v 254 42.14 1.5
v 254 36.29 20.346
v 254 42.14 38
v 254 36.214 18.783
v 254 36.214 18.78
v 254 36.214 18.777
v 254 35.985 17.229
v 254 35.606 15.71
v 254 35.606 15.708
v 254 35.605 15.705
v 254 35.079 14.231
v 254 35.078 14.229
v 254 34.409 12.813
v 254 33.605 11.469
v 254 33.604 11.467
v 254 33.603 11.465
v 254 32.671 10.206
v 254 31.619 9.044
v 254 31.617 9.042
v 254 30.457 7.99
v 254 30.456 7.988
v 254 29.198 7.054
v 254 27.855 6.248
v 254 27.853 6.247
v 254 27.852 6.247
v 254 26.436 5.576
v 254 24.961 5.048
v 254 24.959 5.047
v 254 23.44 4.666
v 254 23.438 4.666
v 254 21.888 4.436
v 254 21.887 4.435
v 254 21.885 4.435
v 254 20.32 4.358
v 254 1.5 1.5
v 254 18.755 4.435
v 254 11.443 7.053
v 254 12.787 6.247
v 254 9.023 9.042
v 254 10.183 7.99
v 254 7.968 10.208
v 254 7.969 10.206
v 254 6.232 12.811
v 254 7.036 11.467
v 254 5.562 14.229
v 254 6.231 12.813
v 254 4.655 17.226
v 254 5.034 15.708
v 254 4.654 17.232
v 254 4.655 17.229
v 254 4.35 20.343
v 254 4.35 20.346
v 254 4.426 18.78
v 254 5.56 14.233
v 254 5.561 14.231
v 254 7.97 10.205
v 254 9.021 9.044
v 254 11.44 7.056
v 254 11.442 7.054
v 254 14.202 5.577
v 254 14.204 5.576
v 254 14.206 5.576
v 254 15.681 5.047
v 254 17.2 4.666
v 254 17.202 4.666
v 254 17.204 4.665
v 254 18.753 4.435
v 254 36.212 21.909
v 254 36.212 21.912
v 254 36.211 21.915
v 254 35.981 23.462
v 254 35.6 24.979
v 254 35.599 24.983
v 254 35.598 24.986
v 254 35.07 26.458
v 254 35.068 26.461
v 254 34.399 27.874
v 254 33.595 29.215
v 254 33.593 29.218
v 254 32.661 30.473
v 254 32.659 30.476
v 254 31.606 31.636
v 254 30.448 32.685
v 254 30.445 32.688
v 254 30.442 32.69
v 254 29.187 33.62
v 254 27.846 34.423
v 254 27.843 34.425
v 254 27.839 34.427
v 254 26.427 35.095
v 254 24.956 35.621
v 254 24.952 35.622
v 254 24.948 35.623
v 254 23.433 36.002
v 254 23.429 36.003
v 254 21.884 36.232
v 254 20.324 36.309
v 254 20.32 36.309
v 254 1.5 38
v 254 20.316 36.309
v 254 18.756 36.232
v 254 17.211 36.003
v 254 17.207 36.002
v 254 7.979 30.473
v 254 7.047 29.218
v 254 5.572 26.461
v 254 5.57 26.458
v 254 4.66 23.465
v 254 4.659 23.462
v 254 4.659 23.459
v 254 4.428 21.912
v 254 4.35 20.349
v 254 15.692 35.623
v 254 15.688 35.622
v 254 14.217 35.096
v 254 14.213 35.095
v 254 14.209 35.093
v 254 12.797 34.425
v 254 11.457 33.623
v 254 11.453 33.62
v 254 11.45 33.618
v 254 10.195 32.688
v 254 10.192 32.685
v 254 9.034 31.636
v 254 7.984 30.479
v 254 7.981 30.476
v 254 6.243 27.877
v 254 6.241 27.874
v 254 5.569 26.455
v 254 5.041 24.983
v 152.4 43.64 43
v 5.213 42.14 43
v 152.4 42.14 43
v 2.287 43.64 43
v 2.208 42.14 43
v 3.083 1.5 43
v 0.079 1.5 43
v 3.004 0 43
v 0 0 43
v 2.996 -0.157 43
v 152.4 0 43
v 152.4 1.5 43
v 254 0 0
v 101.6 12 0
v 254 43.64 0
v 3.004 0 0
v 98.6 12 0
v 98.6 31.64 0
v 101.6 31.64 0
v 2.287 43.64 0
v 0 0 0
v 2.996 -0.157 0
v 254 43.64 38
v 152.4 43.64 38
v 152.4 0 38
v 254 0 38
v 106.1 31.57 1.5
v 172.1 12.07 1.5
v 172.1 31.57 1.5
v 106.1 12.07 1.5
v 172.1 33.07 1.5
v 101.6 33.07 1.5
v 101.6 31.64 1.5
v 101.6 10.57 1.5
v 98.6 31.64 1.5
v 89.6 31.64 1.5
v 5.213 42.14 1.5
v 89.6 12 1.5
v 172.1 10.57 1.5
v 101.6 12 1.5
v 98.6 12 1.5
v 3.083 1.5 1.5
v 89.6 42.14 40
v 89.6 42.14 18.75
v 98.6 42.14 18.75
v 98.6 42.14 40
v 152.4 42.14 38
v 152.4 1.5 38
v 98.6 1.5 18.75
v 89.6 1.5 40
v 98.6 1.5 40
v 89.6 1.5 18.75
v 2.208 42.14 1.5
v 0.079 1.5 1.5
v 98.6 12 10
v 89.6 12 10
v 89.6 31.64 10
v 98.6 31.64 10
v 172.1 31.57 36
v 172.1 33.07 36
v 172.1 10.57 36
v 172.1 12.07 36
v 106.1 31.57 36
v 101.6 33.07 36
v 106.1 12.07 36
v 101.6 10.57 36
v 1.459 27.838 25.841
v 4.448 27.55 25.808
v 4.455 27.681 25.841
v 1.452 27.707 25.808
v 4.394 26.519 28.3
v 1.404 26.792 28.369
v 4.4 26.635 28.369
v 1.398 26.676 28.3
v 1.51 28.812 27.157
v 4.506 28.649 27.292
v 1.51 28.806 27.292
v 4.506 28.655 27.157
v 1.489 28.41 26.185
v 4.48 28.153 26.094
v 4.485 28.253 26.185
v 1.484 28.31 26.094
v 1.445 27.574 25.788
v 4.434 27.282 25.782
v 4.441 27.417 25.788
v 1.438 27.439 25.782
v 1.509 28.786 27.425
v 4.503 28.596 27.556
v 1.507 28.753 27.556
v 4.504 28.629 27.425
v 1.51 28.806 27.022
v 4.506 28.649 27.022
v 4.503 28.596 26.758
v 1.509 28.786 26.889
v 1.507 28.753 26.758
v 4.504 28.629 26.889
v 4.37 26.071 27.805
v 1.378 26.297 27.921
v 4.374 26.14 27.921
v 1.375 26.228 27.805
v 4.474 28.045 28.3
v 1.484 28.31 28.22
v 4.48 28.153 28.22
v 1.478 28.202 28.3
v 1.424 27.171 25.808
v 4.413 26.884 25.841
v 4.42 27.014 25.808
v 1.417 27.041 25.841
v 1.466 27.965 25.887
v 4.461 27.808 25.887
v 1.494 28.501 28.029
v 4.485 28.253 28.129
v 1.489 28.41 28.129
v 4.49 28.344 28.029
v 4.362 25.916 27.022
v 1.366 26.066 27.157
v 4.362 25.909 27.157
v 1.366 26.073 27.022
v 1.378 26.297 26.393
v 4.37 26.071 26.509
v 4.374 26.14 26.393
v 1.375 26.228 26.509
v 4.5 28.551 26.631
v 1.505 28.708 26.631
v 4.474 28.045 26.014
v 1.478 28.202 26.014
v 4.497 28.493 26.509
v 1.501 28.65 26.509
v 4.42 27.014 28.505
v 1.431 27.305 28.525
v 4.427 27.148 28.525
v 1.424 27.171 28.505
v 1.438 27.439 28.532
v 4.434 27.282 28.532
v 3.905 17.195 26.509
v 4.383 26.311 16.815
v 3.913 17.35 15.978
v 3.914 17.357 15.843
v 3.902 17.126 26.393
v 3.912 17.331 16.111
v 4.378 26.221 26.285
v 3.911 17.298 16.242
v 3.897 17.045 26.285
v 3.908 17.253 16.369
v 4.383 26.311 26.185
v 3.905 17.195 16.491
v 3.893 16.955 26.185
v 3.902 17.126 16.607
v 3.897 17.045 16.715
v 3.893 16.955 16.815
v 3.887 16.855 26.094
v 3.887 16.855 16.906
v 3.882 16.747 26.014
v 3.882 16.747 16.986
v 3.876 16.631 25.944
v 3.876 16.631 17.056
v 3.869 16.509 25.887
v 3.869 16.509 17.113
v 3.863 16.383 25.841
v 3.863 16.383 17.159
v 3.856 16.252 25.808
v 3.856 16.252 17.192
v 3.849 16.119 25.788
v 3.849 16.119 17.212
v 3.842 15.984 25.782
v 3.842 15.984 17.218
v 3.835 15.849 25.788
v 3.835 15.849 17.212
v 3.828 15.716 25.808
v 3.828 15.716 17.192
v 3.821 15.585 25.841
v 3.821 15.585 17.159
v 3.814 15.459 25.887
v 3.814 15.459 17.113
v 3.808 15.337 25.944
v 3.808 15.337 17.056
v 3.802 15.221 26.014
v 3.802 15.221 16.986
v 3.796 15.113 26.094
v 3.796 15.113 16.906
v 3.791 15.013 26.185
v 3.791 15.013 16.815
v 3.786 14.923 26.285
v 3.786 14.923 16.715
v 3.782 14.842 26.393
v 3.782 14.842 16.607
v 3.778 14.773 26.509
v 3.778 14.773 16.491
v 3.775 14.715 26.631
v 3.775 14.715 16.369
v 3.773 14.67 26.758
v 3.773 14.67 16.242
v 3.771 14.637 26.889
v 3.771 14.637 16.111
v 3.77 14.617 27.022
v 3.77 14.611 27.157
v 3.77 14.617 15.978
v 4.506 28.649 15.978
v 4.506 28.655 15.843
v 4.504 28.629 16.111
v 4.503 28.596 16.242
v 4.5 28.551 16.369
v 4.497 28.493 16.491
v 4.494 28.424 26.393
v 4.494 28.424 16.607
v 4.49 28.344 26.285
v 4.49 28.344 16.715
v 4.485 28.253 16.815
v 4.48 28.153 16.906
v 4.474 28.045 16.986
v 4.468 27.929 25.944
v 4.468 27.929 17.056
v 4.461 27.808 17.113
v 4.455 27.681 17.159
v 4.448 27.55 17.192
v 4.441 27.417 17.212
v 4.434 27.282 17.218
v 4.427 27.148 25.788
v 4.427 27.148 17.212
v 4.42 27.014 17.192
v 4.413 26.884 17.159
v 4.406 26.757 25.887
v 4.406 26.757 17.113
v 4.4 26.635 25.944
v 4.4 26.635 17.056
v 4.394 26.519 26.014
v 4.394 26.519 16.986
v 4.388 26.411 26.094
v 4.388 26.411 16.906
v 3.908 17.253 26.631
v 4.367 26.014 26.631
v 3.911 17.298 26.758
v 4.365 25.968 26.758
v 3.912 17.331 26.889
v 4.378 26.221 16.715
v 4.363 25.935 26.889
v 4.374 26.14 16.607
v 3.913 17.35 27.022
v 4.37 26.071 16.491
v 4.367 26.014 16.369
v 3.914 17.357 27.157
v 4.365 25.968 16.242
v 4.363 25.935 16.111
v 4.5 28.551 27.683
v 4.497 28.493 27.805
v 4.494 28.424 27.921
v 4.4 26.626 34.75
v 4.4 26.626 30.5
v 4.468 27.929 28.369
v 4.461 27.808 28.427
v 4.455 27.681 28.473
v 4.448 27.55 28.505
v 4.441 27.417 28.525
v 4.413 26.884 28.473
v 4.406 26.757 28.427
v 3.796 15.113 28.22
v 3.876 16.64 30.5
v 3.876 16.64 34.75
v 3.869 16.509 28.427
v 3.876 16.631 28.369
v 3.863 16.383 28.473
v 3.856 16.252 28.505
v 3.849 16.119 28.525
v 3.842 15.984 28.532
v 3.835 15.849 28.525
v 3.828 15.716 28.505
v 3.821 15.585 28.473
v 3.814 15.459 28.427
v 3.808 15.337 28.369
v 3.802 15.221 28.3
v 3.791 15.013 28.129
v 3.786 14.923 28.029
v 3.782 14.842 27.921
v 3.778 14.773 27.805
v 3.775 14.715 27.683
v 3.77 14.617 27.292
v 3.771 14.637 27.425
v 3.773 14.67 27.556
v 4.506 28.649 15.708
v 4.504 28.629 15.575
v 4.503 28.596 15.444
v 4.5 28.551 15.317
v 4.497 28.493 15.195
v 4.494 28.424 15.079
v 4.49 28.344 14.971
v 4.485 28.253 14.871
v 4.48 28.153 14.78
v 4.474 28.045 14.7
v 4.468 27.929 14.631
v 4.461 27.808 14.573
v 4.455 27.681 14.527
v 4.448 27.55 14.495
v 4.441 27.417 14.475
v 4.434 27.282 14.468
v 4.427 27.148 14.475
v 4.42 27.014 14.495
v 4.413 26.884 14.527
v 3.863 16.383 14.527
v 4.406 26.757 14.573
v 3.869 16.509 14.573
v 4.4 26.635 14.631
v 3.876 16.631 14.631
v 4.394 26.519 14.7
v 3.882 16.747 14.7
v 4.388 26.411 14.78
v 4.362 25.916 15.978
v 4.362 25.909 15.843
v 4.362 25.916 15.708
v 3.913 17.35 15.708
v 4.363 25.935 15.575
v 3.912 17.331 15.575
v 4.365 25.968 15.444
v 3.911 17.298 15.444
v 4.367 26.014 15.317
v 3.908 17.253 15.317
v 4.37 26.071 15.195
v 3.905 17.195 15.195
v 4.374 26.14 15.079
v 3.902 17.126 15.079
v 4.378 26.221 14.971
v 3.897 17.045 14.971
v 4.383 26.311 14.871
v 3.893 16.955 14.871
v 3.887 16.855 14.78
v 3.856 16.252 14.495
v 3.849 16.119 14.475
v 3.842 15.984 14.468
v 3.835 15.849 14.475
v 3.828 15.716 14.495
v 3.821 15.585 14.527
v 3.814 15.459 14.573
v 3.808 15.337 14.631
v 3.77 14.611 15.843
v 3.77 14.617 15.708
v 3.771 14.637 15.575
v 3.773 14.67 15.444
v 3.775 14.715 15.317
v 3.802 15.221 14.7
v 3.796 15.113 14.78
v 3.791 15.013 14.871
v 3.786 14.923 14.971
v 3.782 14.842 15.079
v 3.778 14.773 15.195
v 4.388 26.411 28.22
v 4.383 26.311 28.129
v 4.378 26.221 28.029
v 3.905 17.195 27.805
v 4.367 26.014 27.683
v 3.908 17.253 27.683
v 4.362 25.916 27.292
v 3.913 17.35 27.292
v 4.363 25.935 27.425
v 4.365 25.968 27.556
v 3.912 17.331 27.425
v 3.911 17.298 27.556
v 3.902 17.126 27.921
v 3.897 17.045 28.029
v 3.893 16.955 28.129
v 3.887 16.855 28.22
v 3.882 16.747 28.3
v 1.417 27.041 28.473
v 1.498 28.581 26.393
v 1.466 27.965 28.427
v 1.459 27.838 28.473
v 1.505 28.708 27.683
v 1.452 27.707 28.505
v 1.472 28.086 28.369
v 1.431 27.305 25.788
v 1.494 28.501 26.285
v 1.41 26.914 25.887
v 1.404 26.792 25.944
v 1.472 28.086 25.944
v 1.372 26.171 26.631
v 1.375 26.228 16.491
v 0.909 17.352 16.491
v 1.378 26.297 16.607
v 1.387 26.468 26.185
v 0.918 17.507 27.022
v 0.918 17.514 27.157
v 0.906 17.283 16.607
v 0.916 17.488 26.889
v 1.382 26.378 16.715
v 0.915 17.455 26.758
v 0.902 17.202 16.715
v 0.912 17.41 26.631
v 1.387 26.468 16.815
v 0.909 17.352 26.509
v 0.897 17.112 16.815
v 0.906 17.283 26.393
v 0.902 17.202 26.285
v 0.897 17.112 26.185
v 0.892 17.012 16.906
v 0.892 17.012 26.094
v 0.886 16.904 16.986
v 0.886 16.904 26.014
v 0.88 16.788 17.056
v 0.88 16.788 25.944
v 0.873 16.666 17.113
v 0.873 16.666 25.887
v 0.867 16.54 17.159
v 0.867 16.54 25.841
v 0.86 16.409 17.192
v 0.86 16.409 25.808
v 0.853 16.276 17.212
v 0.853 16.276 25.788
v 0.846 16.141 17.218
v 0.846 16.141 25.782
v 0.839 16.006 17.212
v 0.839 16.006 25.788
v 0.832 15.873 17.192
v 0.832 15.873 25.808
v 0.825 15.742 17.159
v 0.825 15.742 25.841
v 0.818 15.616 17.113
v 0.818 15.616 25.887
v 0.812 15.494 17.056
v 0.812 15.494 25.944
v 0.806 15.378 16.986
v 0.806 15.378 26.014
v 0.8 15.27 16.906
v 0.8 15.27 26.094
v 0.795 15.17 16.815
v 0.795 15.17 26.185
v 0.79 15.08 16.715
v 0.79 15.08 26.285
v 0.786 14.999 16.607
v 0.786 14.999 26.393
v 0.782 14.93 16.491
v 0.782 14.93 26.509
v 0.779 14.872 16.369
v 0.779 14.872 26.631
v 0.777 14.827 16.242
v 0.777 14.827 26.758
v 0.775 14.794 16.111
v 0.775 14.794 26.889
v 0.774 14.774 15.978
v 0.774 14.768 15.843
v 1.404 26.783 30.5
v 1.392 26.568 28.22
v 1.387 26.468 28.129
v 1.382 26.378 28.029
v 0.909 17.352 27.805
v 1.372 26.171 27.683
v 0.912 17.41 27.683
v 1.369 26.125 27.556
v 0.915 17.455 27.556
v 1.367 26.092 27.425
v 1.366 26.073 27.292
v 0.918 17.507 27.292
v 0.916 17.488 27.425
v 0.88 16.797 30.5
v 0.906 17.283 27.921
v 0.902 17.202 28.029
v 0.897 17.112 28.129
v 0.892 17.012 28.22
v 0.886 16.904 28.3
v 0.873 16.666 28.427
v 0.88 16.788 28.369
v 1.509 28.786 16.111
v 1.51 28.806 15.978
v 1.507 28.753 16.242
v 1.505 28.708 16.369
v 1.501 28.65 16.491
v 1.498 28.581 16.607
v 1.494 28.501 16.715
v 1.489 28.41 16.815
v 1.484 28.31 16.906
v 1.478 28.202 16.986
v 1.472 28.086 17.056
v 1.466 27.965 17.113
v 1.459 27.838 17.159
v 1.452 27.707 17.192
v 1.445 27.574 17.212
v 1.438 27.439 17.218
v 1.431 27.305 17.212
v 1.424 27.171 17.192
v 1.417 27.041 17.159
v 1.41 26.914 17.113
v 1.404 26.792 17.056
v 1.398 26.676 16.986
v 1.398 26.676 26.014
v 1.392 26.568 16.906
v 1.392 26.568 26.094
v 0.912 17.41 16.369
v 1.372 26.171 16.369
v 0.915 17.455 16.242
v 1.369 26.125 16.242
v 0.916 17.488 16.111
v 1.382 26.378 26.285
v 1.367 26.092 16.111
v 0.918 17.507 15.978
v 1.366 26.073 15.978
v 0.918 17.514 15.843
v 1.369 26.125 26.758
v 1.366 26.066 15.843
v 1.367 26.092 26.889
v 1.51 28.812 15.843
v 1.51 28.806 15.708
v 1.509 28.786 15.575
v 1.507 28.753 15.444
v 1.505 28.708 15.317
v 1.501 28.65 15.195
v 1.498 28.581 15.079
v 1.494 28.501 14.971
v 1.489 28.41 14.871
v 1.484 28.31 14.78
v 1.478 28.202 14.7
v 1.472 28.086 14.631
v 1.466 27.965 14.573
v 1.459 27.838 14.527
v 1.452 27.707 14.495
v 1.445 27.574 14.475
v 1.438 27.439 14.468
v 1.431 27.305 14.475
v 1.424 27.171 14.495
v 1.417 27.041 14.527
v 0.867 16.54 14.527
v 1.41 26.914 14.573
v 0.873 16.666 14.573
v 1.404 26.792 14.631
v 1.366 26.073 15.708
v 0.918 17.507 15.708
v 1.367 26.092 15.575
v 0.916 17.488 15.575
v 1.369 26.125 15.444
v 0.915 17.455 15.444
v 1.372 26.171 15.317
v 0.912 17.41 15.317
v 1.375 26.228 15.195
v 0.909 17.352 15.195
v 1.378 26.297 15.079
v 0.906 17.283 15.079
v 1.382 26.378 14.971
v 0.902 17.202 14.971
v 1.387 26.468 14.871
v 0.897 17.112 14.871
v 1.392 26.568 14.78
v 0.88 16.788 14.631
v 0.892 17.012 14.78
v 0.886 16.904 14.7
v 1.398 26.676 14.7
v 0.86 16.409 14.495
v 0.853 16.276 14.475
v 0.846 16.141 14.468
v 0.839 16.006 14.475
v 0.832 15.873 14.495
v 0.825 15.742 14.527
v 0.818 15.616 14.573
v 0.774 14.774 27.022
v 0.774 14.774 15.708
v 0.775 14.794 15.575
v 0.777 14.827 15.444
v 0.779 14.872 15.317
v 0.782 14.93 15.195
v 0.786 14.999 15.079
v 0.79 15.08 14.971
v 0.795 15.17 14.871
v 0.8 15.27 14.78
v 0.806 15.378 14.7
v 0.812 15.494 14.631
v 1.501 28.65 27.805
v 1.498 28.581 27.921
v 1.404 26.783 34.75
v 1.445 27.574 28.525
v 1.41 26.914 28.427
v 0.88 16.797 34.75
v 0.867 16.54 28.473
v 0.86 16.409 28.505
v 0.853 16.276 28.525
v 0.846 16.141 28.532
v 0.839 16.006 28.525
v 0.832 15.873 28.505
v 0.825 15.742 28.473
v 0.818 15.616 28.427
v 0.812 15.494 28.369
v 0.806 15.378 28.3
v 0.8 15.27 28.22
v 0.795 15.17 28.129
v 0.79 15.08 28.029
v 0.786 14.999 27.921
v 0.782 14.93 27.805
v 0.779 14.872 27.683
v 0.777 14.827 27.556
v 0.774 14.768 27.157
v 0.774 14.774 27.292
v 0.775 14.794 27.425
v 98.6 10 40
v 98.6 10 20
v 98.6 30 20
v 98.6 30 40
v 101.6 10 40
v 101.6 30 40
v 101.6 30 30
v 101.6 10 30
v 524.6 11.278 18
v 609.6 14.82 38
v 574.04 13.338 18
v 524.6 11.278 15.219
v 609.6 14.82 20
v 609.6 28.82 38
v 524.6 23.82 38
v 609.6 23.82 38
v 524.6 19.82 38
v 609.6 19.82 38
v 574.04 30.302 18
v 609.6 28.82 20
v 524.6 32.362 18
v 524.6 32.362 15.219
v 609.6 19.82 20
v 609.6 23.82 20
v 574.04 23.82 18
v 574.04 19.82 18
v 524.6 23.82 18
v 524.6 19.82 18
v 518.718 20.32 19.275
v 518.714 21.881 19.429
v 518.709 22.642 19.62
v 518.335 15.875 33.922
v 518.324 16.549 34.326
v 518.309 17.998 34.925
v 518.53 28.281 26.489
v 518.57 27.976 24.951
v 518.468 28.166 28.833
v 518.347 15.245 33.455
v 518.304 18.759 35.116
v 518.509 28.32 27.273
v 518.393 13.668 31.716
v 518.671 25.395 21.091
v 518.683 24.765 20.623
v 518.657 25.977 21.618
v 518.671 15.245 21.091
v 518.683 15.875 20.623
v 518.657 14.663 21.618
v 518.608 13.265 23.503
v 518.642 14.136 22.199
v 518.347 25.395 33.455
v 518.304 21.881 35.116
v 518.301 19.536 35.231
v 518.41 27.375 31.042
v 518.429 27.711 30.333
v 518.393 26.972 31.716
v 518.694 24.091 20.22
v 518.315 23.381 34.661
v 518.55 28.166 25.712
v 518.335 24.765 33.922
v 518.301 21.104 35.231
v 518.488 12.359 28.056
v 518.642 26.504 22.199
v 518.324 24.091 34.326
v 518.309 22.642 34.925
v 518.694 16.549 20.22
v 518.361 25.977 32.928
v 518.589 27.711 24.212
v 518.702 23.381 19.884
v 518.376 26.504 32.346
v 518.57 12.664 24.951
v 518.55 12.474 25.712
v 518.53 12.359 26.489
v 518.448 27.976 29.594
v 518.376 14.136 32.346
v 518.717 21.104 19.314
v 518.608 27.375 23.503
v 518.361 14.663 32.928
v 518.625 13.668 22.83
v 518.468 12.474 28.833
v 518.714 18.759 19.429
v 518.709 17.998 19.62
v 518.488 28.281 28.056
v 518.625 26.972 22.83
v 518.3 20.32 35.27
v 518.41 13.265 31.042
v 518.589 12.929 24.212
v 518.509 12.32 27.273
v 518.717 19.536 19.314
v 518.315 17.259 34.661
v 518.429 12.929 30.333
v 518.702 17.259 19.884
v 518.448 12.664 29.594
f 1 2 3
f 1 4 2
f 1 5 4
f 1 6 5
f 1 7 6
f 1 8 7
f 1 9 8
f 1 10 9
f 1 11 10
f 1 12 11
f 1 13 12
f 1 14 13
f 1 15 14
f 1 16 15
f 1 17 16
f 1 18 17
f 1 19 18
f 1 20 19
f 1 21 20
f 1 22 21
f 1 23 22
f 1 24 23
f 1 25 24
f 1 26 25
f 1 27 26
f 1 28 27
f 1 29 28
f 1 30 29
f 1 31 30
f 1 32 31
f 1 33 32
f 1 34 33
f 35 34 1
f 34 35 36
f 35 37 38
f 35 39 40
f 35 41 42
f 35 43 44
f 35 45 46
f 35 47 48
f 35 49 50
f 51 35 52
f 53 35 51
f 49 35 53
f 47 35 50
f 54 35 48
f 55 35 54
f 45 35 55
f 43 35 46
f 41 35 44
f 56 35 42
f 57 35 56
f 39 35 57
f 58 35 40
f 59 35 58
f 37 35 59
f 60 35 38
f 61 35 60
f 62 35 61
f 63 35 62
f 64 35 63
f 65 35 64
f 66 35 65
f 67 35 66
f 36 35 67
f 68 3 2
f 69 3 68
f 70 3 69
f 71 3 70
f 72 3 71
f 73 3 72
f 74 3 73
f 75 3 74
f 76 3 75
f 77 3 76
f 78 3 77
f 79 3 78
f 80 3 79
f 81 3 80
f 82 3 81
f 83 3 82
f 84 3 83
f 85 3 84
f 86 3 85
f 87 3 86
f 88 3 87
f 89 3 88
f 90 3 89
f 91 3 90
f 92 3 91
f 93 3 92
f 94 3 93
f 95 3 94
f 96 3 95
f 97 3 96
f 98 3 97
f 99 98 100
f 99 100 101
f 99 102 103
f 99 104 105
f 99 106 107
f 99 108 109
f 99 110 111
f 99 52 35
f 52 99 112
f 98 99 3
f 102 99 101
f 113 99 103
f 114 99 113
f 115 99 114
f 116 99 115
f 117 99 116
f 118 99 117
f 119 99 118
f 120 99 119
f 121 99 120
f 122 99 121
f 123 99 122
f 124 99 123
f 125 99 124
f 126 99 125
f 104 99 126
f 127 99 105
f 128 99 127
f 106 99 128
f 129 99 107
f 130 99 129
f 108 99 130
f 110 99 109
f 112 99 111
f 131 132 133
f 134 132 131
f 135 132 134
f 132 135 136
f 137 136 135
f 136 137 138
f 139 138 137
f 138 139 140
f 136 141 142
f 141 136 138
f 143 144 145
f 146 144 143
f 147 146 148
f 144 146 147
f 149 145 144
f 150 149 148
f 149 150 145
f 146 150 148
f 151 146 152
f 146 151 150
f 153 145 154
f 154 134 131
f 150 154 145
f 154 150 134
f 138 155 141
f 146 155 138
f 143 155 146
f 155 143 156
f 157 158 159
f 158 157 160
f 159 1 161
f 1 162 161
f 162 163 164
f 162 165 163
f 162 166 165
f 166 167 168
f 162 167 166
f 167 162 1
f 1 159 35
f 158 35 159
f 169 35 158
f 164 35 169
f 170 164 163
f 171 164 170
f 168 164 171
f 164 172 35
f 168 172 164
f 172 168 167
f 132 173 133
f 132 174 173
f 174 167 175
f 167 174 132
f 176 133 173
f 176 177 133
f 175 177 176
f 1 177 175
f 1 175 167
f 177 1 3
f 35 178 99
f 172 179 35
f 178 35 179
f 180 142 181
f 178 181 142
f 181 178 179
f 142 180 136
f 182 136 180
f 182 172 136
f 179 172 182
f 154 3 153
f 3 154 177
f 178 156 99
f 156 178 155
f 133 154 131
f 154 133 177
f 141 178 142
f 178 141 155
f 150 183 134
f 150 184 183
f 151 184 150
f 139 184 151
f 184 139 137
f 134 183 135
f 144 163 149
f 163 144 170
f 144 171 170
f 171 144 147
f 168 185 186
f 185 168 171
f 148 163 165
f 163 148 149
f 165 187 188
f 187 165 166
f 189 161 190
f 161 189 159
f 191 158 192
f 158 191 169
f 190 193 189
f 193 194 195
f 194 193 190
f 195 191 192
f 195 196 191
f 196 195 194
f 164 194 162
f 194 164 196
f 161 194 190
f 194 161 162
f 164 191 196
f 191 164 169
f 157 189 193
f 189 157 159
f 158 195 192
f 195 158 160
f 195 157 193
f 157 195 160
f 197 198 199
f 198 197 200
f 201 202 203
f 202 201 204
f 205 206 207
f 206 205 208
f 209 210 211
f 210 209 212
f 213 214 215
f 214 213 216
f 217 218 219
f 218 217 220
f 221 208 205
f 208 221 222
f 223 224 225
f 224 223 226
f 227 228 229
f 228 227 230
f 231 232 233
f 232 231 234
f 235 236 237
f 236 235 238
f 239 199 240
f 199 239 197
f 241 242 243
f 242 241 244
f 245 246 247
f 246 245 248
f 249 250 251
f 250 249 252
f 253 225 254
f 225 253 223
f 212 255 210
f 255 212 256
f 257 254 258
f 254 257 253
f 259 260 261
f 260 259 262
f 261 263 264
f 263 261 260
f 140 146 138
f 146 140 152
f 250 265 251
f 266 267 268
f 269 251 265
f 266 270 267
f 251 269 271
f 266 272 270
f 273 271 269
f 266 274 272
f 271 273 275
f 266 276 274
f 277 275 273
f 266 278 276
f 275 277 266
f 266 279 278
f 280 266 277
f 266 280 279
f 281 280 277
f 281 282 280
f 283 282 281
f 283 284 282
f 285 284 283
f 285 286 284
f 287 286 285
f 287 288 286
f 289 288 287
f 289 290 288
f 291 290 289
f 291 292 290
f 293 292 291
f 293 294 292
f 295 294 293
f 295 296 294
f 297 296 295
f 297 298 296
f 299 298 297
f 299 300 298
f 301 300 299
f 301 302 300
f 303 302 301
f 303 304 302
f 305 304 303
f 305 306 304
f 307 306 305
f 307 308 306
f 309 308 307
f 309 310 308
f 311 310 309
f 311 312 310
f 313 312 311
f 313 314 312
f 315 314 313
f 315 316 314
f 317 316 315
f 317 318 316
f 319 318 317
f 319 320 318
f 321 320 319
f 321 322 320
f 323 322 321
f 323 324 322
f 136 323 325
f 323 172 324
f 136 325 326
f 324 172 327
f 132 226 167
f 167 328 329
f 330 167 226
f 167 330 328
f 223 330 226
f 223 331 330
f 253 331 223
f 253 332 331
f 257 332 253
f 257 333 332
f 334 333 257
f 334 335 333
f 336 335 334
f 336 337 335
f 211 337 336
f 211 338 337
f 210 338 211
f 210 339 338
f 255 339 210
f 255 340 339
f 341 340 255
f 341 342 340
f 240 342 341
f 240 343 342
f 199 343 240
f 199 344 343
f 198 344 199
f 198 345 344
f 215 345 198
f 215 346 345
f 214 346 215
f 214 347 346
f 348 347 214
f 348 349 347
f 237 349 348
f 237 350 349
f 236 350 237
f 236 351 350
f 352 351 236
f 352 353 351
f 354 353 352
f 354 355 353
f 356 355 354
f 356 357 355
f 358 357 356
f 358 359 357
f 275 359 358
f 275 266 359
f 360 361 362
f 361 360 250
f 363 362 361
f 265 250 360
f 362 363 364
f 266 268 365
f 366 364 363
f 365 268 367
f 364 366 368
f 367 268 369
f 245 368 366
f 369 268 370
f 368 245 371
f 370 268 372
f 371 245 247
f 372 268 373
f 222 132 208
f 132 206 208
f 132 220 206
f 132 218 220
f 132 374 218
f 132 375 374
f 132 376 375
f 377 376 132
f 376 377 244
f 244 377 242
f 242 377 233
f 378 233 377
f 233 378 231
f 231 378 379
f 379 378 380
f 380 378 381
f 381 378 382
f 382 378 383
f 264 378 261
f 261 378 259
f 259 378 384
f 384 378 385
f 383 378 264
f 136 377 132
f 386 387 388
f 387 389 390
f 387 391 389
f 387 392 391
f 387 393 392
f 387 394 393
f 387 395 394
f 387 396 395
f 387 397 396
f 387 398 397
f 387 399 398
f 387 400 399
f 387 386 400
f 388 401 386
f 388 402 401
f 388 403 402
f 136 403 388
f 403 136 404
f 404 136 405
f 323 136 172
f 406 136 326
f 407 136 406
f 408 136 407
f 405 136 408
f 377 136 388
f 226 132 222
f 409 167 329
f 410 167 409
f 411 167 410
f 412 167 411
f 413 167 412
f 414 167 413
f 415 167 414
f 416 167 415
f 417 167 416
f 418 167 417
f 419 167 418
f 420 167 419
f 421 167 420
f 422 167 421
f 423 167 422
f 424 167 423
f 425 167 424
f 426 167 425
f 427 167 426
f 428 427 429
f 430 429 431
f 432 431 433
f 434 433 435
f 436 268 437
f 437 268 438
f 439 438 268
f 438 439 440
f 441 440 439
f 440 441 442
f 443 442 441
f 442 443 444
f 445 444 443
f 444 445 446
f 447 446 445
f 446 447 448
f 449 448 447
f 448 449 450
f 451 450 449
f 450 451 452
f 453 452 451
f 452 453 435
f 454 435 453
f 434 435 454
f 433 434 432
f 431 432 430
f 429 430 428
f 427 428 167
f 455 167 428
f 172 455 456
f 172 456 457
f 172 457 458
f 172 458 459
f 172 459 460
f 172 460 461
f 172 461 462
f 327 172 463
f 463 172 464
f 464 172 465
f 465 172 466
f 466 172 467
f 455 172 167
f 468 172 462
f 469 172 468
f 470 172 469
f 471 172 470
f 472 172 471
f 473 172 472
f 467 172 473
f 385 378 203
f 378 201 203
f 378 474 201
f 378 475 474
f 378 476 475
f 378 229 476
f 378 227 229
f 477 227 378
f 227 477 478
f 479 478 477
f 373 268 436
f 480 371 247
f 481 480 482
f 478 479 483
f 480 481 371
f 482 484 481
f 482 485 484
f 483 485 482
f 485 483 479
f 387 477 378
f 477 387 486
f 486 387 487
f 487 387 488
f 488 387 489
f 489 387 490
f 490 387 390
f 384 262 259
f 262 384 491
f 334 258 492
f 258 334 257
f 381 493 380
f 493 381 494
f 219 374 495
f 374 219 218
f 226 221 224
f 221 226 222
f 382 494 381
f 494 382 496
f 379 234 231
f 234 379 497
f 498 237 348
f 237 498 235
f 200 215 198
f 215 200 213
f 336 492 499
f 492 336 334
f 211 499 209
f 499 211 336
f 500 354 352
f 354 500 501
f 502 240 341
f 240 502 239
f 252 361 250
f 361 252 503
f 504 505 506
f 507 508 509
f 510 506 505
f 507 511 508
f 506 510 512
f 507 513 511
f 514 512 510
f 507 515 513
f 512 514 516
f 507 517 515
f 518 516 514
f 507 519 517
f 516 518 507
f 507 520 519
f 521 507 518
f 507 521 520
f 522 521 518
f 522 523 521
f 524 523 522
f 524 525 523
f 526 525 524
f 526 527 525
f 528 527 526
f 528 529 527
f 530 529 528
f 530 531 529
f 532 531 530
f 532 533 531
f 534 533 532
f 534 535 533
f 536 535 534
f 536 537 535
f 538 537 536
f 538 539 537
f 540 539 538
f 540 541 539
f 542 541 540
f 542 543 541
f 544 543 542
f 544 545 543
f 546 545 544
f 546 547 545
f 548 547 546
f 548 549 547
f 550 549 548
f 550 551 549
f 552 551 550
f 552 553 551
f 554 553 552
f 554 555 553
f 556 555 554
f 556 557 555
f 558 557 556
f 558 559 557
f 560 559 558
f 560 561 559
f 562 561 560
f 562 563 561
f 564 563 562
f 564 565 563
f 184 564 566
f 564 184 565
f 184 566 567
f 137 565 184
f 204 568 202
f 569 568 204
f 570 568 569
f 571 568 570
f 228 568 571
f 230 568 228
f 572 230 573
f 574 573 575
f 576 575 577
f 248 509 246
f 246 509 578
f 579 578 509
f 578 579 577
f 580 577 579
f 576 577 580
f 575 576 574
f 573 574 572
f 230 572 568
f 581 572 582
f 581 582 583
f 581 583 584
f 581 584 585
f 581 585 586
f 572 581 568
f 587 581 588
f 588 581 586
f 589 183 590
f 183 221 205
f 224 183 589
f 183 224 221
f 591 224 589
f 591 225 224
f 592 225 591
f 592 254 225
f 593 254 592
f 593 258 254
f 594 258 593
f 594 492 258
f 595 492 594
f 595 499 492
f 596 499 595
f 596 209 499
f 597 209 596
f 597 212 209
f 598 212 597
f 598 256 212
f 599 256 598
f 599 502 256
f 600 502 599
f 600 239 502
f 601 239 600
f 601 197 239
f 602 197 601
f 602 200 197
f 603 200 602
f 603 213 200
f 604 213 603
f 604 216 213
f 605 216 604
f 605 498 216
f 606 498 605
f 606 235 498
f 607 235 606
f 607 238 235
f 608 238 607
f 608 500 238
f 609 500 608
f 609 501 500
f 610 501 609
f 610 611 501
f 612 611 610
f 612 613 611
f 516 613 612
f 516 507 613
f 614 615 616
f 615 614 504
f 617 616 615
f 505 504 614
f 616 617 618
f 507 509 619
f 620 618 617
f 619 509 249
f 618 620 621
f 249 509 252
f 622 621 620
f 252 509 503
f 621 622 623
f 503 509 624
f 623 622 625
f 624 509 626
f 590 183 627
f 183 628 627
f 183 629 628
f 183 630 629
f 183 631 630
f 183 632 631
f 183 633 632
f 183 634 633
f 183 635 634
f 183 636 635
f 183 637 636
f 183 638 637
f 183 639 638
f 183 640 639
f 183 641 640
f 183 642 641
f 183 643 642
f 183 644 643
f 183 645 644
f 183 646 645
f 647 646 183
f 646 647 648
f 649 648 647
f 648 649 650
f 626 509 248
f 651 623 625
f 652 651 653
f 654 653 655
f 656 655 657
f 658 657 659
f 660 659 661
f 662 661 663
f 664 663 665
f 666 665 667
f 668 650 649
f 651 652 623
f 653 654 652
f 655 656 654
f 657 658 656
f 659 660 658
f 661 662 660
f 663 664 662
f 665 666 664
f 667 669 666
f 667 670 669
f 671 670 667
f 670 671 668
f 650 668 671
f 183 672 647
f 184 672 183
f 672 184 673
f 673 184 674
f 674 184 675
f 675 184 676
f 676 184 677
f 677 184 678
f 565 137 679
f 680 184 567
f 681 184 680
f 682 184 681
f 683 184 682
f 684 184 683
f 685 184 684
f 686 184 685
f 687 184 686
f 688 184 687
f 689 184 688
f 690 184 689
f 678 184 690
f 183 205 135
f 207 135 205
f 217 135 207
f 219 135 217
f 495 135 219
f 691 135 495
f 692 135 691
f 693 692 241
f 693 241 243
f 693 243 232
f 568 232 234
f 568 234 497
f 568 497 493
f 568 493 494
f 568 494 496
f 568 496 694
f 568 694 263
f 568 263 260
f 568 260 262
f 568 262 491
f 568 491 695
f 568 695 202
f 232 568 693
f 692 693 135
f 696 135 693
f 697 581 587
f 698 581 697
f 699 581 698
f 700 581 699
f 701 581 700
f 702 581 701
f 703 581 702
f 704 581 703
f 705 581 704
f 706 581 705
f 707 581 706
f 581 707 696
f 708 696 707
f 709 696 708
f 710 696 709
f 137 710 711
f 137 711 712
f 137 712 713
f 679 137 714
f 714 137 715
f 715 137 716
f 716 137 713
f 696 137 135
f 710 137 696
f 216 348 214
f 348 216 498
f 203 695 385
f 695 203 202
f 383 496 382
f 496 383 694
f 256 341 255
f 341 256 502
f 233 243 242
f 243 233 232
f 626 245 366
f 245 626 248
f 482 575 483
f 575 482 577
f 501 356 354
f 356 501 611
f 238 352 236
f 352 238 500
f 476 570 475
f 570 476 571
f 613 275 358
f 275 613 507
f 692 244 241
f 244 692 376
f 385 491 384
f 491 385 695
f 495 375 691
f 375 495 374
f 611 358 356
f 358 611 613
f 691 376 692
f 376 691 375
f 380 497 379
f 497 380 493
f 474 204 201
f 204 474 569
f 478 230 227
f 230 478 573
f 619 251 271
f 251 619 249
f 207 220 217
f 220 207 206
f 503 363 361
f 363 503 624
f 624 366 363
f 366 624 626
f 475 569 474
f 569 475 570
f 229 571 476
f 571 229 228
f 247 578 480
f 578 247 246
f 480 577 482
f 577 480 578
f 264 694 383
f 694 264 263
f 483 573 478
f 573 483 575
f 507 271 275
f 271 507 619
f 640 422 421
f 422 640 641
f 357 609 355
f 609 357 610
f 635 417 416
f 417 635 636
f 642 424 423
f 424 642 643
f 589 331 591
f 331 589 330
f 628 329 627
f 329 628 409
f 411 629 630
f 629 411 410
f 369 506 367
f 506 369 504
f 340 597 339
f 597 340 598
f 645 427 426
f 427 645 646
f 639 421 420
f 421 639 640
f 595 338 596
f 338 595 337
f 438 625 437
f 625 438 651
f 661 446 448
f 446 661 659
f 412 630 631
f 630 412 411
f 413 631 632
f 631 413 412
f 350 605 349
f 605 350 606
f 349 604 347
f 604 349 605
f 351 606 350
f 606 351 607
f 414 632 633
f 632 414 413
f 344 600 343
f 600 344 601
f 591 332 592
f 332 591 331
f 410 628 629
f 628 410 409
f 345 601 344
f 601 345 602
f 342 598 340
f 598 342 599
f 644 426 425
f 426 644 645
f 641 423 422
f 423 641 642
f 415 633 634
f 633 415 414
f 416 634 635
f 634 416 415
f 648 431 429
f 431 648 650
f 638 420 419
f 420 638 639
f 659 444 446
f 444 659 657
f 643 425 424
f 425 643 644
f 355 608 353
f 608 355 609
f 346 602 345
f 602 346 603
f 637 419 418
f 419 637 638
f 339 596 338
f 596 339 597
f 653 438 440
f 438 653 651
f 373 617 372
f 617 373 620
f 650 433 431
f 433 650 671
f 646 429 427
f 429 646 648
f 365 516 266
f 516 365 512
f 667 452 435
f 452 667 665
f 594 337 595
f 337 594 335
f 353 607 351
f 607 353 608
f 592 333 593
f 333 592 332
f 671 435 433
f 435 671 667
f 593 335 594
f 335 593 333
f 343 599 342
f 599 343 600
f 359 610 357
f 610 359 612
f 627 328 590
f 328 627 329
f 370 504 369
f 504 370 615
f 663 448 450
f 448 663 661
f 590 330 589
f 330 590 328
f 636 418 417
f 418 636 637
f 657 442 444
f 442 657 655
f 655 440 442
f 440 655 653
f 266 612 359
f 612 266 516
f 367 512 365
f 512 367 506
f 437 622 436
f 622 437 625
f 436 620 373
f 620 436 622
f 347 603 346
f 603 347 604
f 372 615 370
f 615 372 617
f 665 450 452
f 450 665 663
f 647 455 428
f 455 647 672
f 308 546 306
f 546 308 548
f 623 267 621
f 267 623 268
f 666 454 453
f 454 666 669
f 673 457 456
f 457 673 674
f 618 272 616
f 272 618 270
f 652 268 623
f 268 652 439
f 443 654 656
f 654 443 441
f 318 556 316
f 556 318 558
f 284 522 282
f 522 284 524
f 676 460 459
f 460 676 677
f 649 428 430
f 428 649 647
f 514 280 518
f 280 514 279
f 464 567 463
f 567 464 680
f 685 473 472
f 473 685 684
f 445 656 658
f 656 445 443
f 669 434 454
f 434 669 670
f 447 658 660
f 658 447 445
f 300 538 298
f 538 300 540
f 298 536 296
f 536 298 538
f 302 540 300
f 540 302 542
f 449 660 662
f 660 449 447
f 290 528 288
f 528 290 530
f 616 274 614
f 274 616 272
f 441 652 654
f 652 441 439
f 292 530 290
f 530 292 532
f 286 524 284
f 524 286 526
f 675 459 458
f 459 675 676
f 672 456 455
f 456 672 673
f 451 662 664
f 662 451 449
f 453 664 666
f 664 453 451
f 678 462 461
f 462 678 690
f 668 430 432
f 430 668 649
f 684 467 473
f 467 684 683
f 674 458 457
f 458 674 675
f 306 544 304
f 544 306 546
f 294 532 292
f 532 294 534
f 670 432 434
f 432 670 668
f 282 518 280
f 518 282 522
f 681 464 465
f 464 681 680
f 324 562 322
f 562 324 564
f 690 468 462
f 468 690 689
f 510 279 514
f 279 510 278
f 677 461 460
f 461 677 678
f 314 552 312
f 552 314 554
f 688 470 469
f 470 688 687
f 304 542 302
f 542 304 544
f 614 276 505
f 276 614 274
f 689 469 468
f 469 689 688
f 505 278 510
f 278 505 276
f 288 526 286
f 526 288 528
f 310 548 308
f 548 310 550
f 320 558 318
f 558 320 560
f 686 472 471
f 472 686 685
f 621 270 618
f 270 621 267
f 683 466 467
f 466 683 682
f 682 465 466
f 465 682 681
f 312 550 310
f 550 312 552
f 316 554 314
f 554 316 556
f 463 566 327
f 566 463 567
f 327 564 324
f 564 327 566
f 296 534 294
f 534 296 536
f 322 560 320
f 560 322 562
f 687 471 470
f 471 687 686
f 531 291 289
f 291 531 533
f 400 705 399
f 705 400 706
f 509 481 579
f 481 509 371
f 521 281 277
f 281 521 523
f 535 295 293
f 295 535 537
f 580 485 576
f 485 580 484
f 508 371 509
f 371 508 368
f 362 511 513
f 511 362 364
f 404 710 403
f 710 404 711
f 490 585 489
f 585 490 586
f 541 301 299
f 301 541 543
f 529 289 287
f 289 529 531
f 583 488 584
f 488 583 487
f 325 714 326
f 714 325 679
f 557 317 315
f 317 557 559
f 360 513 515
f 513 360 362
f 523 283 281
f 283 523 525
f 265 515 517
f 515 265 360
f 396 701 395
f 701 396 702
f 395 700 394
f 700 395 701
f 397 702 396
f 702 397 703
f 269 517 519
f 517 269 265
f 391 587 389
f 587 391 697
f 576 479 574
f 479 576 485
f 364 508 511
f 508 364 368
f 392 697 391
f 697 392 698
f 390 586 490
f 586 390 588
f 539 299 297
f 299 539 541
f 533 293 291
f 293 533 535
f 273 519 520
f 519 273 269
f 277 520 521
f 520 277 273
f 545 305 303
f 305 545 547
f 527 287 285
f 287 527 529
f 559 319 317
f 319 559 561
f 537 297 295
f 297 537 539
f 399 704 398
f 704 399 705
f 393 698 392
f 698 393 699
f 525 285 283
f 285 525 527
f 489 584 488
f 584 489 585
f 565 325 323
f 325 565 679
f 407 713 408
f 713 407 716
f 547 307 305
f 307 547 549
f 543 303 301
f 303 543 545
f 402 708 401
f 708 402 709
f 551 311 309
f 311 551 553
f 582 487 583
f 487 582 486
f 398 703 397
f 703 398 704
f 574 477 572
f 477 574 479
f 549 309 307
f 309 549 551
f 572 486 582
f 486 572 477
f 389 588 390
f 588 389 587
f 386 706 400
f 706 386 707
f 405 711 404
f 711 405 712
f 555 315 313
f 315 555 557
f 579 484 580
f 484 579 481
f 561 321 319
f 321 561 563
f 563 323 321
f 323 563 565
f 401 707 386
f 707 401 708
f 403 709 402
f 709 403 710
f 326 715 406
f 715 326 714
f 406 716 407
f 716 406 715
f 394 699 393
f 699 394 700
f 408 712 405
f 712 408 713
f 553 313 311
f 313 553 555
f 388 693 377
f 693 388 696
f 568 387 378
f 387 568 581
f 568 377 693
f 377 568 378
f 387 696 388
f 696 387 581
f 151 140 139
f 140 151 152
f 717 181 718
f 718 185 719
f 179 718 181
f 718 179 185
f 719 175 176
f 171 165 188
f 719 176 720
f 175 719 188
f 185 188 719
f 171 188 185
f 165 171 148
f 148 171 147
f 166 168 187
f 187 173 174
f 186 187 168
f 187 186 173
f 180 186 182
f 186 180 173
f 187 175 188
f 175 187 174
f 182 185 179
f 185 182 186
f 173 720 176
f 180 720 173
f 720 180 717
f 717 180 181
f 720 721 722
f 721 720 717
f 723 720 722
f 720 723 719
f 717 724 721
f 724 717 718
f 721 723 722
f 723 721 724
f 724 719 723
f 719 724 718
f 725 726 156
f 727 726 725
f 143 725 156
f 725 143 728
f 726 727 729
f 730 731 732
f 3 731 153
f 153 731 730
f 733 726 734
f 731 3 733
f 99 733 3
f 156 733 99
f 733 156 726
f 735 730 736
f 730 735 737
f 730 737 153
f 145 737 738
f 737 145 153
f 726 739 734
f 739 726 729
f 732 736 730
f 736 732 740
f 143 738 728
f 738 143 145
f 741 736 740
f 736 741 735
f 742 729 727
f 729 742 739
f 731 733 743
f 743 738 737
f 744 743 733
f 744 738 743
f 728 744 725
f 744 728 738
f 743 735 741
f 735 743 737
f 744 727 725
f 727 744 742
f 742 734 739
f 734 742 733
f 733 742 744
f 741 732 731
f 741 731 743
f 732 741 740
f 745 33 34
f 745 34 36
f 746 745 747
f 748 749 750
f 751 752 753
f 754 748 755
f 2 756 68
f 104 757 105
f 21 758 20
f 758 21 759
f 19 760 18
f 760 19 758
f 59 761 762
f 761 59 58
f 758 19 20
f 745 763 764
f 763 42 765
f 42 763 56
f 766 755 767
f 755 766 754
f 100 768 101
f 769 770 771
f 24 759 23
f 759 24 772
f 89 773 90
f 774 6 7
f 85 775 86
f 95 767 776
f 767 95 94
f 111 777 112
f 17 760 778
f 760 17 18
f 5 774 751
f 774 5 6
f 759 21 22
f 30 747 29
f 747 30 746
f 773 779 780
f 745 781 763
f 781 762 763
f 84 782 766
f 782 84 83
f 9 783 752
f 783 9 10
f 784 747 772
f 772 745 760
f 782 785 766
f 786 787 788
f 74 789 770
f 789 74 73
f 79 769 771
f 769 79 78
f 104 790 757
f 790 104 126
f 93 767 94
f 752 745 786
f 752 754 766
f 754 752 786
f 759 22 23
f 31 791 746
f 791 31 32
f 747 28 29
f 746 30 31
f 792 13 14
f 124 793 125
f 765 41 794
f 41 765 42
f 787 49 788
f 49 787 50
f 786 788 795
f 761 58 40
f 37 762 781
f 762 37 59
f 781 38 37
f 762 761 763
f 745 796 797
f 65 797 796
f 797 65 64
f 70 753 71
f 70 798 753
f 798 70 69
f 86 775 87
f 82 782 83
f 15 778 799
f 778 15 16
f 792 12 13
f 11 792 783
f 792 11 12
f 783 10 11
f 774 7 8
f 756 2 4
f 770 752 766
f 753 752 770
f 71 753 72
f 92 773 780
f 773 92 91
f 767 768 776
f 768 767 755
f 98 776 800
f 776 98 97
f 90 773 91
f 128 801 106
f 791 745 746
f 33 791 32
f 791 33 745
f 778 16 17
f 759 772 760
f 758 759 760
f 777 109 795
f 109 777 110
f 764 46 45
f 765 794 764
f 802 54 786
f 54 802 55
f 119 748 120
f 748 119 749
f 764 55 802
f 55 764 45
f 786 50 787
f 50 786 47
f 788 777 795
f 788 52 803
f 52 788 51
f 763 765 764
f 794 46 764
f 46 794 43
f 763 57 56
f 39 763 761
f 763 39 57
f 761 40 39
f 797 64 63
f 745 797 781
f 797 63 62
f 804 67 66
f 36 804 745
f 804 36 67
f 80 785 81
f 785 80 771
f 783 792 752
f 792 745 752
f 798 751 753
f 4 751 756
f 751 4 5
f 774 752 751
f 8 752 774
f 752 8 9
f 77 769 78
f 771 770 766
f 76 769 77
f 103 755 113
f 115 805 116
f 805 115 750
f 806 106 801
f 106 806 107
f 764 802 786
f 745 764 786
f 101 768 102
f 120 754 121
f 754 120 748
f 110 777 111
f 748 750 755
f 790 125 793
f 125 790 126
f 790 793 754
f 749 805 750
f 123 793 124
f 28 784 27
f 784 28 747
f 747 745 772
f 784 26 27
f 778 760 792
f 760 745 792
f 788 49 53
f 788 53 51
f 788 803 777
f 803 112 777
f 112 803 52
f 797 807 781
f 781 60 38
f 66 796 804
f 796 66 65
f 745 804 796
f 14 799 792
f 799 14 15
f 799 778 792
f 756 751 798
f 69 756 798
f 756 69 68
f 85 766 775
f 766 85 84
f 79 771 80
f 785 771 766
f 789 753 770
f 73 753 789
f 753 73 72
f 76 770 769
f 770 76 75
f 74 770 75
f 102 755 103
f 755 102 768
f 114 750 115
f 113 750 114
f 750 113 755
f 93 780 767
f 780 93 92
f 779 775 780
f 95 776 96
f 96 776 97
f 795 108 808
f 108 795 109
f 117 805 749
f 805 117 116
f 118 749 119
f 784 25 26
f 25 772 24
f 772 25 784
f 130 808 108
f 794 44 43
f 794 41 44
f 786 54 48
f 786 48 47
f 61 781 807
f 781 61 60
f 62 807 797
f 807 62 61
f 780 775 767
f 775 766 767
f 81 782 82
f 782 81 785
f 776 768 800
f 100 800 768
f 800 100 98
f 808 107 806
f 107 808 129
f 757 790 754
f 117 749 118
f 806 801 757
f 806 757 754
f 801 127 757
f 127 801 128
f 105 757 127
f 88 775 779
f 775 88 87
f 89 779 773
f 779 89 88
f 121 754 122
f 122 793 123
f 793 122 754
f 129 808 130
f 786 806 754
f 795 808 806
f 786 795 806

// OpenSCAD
// SimplePlane
// ----------------------

$fn=64;

function inchToMm(x) = x*25.4;

// Parameters
length=inchToMm(24);
width=inchToMm(1.6);  //(inside width)
height=40;
wallWidth=1.5;

noseLength=inchToMm(10);

batteryWidth=19.5;
batteryHeight=34.5;
batteryLength=69;
batteryPos=inchToMm(4);

servoWidth=12;
servoLength=23.75;
servoHeight=18;
servoPos=inchToMm(8);

wingLeadingEdge=inchToMm(6);
wingCutoutHeight=5;

motorMountLength=3;
motorMountHoleSize=2.75/2;
motorMountHolePatternRadius=8;

thrustAngle=3;

outerWidth = width + (2 * wallWidth);
outerHeight = height + (2 * wallWidth);

batteryHolderOuterWidth=batteryWidth+(2*wallWidth);
batteryHolderOffset=(outerWidth - batteryHolderOuterWidth) / 2;
    
tailWidth=14;
tailLength=inchToMm(14);
    
jointLength=20;
    
mode=0;

if (mode==0) Plane(); // Whole Plane
if (mode==1) NoseSegment(0,80, true); // Nose Section
if (mode==2) NoseSegment(80,120, false); // Battery Section
if (mode==3) NoseSegment(200,120, false);    
if (mode==4) NoseSegment(320,150, true);
if (mode==5) NoseSegment(470,150, true);
if (mode==6) FrontWingClip();

module BackWingClip()
{
    difference()
    {
        cube([12,width-5, 2],center=true);
        cylinder(h=10, r=1,center=true);
    }
}

module FrontWingClip()
{
    h1=9;
    h2=4;
    d2=tan(72)*h2;
    echo(d2);
    t=2;
    tabThickness=8.9;
    
    difference()
    {
        union()
        {
            linear_extrude(width)
            polygon([[-15,0],
                 [0,h1+t],
                 [d2,h1+h2],
                 [d2,h1+h2-t],
                 [t,h1],
                 [t,0],
                 [0,0]]
            );
            
            linear_extrude(tabThickness)
            polygon([
                [-15,0],
                [t,0],
                [t+10, -15],
                [-25, -15]
            ]);
            
            translate([0,0,width-tabThickness])
            linear_extrude(tabThickness)
            polygon([
                [-15,0],
                [t,0],
                [t+10, -15],
                [-25, -15]
            ]);
        }
        translate([0,0,width/2])
        rotate([0,0,15])
        cube([40, 9, batteryWidth], center=true);
    }
}

module NoseSegment(start, end, first)
{
intersection()
{
        translate([-start,0,0]) Plane();
        cube([end,1000,1000]);
}

    if (!first)
    {
        translate([-(jointLength/2),wallWidth,wallWidth])
        joint();
    }
}

module joint()
{
    jointThickness=1;
    jointMargin=.2;
    jointHeight=height+wallWidth-wingCutoutHeight;
    difference()
    {
        cube([jointLength, width, jointHeight]);
        cube([jointLength/2,jointMargin,jointHeight]);
        cube([jointLength/2,width,jointMargin]);
        translate([0,width-jointMargin,0]) cube([jointLength/2,jointMargin,jointHeight]);
        translate([0,jointThickness,jointThickness]) 
            cube([jointLength, width-(2*jointThickness), jointHeight]);
    }
}

module WingHolder()
{
    //translate([10, -8, 60])
    
    difference()
    {
        cube([5, 16+outerWidth, 8]);
        translate([0,8,0]) cube([6, outerWidth, 4]);
    }
}

module Plane()
{
    union()
    {
        NoseModule();
        translate([noseLength,0,0])Tail();
    }
}

module NoseModule()
{
    landingGearDiameter=3;
    
    union()
    {
    difference()
    {
        cube([noseLength, outerWidth, outerHeight]);
        
        translate([0, wallWidth, wallWidth]) cube([noseLength, width, height+wallWidth]);
        
        translate([wingLeadingEdge,0,outerHeight-wingCutoutHeight]) cube([noseLength, outerWidth, wingCutoutHeight]);
        
        NoseCutout();
        
        // slot for landing gear
        linear_extrude(50)
        polygon([[batteryPos-landingGearDiameter,12],
                 [batteryPos-landingGearDiameter,outerWidth-12],
                 [batteryPos,outerWidth-12],
                 [batteryPos,12]]);
       
    }

    // front support for landing gear
    translate([batteryPos-3,0,0])
    rotate([0,-90,0])
    linear_extrude(9)    
    polygon([[0, 12],
             [10, 12],
             [20, 0],
             [height, 0],
             [height, outerWidth],
             [20, outerWidth],
             [10, outerWidth-12],
             [0, outerWidth-12]]);
 
    
    // connect front support to battery holder
    translate([batteryPos-landingGearDiameter,30,0])
    rotate([90,0,0])
    linear_extrude(20)
    polygon([[0,20],
             [landingGearDiameter,30],
             [landingGearDiameter,height],
             [0, height],
             [0,20]]);
    
    translate([batteryPos,batteryHolderOffset,wallWidth]) BatteryHolder();
    
    translate([0,0,0]) Nose();
    }   
}

module Nose()
{
    rotate([0,0,-thrustAngle])
    difference()
    {
    cube([motorMountLength, outerWidth, outerHeight]);
    translate([0,outerWidth/2,outerHeight/2]) MotorMount();
    }
}

module NoseCutout()
{
    rotate([0,0,-thrustAngle])
    translate([-10,0,0])
    cube([10, outerWidth+10, outerHeight]);
}

module MotorMount()
{
    offset=sqrt((motorMountHolePatternRadius*motorMountHolePatternRadius)/2);
    
    union()
    {
        translate([0,offset,offset])
        rotate([0,90,0])
        cylinder(motorMountLength, motorMountHoleSize, motorMountHoleSize);
        
        translate([0,offset,-offset])
        rotate([0,90,0])
        cylinder(motorMountLength, motorMountHoleSize, motorMountHoleSize);
        
        translate([0,-offset,-offset])
        rotate([0,90,0])
        cylinder(motorMountLength, motorMountHoleSize, motorMountHoleSize);
        
        translate([0,-offset,offset])
        rotate([0,90,0])
        cylinder(motorMountLength, motorMountHoleSize, motorMountHoleSize);
        
        translate([0,-5,9])
        cube([motorMountLength,10,4.25]);
    }
}

module BatteryHolder()
{
    union()
    {
        difference()
        {
            cube([batteryLength+wallWidth, batteryHolderOuterWidth, batteryHeight]);
            translate([0,wallWidth,0])
            cube([batteryLength+wallWidth, batteryWidth, batteryHeight]);
        }
        
        cube([wallWidth+3, batteryHolderOuterWidth, batteryHeight]);
    }
}

module Tail()
{
    offset = (outerWidth-tailWidth) / 2;
        
    hStabWidth=4;
    hStabLength=85;
    hStabOffset=(outerWidth-hStabWidth) / 2;
    tailLength=length-noseLength;
    
    difference()
    {
        linear_extrude(outerHeight-wingCutoutHeight)
        polygon([[0,0],[0, outerWidth],[tailLength, offset+tailWidth],[tailLength,offset]]);

        vStabCutHeight=outerHeight-wingCutoutHeight-20;
        
        // cut along bottom
        translate([0,50,0])
        rotate([90,0,0])
        linear_extrude(100)
        polygon([[0,0],
            [tailLength,0],
            [tailLength,20]]);

        //cutout for horizontal stabalizer
        translate([0,50,0])
        rotate([90,0,0])
        linear_extrude(100)
        polygon([[tailLength-hStabLength,0],
                [tailLength-hStabLength,vStabCutHeight],
                [tailLength,vStabCutHeight],
                [tailLength,0]]);
        
        //cutout for vertical stabalizer
        linear_extrude(115)
        polygon([[tailLength, hStabOffset],
             [tailLength-hStabLength, hStabOffset],
             [tailLength-hStabLength, hStabOffset+hStabWidth],
             [tailLength, hStabOffset+hStabWidth]]);
        
        // hollow part
        translate([-1,width/2, width/2])
        rotate([0,88.5,0])
        cylinder(tailLength-hStabLength-5, 16, 8); 
    } 
}
